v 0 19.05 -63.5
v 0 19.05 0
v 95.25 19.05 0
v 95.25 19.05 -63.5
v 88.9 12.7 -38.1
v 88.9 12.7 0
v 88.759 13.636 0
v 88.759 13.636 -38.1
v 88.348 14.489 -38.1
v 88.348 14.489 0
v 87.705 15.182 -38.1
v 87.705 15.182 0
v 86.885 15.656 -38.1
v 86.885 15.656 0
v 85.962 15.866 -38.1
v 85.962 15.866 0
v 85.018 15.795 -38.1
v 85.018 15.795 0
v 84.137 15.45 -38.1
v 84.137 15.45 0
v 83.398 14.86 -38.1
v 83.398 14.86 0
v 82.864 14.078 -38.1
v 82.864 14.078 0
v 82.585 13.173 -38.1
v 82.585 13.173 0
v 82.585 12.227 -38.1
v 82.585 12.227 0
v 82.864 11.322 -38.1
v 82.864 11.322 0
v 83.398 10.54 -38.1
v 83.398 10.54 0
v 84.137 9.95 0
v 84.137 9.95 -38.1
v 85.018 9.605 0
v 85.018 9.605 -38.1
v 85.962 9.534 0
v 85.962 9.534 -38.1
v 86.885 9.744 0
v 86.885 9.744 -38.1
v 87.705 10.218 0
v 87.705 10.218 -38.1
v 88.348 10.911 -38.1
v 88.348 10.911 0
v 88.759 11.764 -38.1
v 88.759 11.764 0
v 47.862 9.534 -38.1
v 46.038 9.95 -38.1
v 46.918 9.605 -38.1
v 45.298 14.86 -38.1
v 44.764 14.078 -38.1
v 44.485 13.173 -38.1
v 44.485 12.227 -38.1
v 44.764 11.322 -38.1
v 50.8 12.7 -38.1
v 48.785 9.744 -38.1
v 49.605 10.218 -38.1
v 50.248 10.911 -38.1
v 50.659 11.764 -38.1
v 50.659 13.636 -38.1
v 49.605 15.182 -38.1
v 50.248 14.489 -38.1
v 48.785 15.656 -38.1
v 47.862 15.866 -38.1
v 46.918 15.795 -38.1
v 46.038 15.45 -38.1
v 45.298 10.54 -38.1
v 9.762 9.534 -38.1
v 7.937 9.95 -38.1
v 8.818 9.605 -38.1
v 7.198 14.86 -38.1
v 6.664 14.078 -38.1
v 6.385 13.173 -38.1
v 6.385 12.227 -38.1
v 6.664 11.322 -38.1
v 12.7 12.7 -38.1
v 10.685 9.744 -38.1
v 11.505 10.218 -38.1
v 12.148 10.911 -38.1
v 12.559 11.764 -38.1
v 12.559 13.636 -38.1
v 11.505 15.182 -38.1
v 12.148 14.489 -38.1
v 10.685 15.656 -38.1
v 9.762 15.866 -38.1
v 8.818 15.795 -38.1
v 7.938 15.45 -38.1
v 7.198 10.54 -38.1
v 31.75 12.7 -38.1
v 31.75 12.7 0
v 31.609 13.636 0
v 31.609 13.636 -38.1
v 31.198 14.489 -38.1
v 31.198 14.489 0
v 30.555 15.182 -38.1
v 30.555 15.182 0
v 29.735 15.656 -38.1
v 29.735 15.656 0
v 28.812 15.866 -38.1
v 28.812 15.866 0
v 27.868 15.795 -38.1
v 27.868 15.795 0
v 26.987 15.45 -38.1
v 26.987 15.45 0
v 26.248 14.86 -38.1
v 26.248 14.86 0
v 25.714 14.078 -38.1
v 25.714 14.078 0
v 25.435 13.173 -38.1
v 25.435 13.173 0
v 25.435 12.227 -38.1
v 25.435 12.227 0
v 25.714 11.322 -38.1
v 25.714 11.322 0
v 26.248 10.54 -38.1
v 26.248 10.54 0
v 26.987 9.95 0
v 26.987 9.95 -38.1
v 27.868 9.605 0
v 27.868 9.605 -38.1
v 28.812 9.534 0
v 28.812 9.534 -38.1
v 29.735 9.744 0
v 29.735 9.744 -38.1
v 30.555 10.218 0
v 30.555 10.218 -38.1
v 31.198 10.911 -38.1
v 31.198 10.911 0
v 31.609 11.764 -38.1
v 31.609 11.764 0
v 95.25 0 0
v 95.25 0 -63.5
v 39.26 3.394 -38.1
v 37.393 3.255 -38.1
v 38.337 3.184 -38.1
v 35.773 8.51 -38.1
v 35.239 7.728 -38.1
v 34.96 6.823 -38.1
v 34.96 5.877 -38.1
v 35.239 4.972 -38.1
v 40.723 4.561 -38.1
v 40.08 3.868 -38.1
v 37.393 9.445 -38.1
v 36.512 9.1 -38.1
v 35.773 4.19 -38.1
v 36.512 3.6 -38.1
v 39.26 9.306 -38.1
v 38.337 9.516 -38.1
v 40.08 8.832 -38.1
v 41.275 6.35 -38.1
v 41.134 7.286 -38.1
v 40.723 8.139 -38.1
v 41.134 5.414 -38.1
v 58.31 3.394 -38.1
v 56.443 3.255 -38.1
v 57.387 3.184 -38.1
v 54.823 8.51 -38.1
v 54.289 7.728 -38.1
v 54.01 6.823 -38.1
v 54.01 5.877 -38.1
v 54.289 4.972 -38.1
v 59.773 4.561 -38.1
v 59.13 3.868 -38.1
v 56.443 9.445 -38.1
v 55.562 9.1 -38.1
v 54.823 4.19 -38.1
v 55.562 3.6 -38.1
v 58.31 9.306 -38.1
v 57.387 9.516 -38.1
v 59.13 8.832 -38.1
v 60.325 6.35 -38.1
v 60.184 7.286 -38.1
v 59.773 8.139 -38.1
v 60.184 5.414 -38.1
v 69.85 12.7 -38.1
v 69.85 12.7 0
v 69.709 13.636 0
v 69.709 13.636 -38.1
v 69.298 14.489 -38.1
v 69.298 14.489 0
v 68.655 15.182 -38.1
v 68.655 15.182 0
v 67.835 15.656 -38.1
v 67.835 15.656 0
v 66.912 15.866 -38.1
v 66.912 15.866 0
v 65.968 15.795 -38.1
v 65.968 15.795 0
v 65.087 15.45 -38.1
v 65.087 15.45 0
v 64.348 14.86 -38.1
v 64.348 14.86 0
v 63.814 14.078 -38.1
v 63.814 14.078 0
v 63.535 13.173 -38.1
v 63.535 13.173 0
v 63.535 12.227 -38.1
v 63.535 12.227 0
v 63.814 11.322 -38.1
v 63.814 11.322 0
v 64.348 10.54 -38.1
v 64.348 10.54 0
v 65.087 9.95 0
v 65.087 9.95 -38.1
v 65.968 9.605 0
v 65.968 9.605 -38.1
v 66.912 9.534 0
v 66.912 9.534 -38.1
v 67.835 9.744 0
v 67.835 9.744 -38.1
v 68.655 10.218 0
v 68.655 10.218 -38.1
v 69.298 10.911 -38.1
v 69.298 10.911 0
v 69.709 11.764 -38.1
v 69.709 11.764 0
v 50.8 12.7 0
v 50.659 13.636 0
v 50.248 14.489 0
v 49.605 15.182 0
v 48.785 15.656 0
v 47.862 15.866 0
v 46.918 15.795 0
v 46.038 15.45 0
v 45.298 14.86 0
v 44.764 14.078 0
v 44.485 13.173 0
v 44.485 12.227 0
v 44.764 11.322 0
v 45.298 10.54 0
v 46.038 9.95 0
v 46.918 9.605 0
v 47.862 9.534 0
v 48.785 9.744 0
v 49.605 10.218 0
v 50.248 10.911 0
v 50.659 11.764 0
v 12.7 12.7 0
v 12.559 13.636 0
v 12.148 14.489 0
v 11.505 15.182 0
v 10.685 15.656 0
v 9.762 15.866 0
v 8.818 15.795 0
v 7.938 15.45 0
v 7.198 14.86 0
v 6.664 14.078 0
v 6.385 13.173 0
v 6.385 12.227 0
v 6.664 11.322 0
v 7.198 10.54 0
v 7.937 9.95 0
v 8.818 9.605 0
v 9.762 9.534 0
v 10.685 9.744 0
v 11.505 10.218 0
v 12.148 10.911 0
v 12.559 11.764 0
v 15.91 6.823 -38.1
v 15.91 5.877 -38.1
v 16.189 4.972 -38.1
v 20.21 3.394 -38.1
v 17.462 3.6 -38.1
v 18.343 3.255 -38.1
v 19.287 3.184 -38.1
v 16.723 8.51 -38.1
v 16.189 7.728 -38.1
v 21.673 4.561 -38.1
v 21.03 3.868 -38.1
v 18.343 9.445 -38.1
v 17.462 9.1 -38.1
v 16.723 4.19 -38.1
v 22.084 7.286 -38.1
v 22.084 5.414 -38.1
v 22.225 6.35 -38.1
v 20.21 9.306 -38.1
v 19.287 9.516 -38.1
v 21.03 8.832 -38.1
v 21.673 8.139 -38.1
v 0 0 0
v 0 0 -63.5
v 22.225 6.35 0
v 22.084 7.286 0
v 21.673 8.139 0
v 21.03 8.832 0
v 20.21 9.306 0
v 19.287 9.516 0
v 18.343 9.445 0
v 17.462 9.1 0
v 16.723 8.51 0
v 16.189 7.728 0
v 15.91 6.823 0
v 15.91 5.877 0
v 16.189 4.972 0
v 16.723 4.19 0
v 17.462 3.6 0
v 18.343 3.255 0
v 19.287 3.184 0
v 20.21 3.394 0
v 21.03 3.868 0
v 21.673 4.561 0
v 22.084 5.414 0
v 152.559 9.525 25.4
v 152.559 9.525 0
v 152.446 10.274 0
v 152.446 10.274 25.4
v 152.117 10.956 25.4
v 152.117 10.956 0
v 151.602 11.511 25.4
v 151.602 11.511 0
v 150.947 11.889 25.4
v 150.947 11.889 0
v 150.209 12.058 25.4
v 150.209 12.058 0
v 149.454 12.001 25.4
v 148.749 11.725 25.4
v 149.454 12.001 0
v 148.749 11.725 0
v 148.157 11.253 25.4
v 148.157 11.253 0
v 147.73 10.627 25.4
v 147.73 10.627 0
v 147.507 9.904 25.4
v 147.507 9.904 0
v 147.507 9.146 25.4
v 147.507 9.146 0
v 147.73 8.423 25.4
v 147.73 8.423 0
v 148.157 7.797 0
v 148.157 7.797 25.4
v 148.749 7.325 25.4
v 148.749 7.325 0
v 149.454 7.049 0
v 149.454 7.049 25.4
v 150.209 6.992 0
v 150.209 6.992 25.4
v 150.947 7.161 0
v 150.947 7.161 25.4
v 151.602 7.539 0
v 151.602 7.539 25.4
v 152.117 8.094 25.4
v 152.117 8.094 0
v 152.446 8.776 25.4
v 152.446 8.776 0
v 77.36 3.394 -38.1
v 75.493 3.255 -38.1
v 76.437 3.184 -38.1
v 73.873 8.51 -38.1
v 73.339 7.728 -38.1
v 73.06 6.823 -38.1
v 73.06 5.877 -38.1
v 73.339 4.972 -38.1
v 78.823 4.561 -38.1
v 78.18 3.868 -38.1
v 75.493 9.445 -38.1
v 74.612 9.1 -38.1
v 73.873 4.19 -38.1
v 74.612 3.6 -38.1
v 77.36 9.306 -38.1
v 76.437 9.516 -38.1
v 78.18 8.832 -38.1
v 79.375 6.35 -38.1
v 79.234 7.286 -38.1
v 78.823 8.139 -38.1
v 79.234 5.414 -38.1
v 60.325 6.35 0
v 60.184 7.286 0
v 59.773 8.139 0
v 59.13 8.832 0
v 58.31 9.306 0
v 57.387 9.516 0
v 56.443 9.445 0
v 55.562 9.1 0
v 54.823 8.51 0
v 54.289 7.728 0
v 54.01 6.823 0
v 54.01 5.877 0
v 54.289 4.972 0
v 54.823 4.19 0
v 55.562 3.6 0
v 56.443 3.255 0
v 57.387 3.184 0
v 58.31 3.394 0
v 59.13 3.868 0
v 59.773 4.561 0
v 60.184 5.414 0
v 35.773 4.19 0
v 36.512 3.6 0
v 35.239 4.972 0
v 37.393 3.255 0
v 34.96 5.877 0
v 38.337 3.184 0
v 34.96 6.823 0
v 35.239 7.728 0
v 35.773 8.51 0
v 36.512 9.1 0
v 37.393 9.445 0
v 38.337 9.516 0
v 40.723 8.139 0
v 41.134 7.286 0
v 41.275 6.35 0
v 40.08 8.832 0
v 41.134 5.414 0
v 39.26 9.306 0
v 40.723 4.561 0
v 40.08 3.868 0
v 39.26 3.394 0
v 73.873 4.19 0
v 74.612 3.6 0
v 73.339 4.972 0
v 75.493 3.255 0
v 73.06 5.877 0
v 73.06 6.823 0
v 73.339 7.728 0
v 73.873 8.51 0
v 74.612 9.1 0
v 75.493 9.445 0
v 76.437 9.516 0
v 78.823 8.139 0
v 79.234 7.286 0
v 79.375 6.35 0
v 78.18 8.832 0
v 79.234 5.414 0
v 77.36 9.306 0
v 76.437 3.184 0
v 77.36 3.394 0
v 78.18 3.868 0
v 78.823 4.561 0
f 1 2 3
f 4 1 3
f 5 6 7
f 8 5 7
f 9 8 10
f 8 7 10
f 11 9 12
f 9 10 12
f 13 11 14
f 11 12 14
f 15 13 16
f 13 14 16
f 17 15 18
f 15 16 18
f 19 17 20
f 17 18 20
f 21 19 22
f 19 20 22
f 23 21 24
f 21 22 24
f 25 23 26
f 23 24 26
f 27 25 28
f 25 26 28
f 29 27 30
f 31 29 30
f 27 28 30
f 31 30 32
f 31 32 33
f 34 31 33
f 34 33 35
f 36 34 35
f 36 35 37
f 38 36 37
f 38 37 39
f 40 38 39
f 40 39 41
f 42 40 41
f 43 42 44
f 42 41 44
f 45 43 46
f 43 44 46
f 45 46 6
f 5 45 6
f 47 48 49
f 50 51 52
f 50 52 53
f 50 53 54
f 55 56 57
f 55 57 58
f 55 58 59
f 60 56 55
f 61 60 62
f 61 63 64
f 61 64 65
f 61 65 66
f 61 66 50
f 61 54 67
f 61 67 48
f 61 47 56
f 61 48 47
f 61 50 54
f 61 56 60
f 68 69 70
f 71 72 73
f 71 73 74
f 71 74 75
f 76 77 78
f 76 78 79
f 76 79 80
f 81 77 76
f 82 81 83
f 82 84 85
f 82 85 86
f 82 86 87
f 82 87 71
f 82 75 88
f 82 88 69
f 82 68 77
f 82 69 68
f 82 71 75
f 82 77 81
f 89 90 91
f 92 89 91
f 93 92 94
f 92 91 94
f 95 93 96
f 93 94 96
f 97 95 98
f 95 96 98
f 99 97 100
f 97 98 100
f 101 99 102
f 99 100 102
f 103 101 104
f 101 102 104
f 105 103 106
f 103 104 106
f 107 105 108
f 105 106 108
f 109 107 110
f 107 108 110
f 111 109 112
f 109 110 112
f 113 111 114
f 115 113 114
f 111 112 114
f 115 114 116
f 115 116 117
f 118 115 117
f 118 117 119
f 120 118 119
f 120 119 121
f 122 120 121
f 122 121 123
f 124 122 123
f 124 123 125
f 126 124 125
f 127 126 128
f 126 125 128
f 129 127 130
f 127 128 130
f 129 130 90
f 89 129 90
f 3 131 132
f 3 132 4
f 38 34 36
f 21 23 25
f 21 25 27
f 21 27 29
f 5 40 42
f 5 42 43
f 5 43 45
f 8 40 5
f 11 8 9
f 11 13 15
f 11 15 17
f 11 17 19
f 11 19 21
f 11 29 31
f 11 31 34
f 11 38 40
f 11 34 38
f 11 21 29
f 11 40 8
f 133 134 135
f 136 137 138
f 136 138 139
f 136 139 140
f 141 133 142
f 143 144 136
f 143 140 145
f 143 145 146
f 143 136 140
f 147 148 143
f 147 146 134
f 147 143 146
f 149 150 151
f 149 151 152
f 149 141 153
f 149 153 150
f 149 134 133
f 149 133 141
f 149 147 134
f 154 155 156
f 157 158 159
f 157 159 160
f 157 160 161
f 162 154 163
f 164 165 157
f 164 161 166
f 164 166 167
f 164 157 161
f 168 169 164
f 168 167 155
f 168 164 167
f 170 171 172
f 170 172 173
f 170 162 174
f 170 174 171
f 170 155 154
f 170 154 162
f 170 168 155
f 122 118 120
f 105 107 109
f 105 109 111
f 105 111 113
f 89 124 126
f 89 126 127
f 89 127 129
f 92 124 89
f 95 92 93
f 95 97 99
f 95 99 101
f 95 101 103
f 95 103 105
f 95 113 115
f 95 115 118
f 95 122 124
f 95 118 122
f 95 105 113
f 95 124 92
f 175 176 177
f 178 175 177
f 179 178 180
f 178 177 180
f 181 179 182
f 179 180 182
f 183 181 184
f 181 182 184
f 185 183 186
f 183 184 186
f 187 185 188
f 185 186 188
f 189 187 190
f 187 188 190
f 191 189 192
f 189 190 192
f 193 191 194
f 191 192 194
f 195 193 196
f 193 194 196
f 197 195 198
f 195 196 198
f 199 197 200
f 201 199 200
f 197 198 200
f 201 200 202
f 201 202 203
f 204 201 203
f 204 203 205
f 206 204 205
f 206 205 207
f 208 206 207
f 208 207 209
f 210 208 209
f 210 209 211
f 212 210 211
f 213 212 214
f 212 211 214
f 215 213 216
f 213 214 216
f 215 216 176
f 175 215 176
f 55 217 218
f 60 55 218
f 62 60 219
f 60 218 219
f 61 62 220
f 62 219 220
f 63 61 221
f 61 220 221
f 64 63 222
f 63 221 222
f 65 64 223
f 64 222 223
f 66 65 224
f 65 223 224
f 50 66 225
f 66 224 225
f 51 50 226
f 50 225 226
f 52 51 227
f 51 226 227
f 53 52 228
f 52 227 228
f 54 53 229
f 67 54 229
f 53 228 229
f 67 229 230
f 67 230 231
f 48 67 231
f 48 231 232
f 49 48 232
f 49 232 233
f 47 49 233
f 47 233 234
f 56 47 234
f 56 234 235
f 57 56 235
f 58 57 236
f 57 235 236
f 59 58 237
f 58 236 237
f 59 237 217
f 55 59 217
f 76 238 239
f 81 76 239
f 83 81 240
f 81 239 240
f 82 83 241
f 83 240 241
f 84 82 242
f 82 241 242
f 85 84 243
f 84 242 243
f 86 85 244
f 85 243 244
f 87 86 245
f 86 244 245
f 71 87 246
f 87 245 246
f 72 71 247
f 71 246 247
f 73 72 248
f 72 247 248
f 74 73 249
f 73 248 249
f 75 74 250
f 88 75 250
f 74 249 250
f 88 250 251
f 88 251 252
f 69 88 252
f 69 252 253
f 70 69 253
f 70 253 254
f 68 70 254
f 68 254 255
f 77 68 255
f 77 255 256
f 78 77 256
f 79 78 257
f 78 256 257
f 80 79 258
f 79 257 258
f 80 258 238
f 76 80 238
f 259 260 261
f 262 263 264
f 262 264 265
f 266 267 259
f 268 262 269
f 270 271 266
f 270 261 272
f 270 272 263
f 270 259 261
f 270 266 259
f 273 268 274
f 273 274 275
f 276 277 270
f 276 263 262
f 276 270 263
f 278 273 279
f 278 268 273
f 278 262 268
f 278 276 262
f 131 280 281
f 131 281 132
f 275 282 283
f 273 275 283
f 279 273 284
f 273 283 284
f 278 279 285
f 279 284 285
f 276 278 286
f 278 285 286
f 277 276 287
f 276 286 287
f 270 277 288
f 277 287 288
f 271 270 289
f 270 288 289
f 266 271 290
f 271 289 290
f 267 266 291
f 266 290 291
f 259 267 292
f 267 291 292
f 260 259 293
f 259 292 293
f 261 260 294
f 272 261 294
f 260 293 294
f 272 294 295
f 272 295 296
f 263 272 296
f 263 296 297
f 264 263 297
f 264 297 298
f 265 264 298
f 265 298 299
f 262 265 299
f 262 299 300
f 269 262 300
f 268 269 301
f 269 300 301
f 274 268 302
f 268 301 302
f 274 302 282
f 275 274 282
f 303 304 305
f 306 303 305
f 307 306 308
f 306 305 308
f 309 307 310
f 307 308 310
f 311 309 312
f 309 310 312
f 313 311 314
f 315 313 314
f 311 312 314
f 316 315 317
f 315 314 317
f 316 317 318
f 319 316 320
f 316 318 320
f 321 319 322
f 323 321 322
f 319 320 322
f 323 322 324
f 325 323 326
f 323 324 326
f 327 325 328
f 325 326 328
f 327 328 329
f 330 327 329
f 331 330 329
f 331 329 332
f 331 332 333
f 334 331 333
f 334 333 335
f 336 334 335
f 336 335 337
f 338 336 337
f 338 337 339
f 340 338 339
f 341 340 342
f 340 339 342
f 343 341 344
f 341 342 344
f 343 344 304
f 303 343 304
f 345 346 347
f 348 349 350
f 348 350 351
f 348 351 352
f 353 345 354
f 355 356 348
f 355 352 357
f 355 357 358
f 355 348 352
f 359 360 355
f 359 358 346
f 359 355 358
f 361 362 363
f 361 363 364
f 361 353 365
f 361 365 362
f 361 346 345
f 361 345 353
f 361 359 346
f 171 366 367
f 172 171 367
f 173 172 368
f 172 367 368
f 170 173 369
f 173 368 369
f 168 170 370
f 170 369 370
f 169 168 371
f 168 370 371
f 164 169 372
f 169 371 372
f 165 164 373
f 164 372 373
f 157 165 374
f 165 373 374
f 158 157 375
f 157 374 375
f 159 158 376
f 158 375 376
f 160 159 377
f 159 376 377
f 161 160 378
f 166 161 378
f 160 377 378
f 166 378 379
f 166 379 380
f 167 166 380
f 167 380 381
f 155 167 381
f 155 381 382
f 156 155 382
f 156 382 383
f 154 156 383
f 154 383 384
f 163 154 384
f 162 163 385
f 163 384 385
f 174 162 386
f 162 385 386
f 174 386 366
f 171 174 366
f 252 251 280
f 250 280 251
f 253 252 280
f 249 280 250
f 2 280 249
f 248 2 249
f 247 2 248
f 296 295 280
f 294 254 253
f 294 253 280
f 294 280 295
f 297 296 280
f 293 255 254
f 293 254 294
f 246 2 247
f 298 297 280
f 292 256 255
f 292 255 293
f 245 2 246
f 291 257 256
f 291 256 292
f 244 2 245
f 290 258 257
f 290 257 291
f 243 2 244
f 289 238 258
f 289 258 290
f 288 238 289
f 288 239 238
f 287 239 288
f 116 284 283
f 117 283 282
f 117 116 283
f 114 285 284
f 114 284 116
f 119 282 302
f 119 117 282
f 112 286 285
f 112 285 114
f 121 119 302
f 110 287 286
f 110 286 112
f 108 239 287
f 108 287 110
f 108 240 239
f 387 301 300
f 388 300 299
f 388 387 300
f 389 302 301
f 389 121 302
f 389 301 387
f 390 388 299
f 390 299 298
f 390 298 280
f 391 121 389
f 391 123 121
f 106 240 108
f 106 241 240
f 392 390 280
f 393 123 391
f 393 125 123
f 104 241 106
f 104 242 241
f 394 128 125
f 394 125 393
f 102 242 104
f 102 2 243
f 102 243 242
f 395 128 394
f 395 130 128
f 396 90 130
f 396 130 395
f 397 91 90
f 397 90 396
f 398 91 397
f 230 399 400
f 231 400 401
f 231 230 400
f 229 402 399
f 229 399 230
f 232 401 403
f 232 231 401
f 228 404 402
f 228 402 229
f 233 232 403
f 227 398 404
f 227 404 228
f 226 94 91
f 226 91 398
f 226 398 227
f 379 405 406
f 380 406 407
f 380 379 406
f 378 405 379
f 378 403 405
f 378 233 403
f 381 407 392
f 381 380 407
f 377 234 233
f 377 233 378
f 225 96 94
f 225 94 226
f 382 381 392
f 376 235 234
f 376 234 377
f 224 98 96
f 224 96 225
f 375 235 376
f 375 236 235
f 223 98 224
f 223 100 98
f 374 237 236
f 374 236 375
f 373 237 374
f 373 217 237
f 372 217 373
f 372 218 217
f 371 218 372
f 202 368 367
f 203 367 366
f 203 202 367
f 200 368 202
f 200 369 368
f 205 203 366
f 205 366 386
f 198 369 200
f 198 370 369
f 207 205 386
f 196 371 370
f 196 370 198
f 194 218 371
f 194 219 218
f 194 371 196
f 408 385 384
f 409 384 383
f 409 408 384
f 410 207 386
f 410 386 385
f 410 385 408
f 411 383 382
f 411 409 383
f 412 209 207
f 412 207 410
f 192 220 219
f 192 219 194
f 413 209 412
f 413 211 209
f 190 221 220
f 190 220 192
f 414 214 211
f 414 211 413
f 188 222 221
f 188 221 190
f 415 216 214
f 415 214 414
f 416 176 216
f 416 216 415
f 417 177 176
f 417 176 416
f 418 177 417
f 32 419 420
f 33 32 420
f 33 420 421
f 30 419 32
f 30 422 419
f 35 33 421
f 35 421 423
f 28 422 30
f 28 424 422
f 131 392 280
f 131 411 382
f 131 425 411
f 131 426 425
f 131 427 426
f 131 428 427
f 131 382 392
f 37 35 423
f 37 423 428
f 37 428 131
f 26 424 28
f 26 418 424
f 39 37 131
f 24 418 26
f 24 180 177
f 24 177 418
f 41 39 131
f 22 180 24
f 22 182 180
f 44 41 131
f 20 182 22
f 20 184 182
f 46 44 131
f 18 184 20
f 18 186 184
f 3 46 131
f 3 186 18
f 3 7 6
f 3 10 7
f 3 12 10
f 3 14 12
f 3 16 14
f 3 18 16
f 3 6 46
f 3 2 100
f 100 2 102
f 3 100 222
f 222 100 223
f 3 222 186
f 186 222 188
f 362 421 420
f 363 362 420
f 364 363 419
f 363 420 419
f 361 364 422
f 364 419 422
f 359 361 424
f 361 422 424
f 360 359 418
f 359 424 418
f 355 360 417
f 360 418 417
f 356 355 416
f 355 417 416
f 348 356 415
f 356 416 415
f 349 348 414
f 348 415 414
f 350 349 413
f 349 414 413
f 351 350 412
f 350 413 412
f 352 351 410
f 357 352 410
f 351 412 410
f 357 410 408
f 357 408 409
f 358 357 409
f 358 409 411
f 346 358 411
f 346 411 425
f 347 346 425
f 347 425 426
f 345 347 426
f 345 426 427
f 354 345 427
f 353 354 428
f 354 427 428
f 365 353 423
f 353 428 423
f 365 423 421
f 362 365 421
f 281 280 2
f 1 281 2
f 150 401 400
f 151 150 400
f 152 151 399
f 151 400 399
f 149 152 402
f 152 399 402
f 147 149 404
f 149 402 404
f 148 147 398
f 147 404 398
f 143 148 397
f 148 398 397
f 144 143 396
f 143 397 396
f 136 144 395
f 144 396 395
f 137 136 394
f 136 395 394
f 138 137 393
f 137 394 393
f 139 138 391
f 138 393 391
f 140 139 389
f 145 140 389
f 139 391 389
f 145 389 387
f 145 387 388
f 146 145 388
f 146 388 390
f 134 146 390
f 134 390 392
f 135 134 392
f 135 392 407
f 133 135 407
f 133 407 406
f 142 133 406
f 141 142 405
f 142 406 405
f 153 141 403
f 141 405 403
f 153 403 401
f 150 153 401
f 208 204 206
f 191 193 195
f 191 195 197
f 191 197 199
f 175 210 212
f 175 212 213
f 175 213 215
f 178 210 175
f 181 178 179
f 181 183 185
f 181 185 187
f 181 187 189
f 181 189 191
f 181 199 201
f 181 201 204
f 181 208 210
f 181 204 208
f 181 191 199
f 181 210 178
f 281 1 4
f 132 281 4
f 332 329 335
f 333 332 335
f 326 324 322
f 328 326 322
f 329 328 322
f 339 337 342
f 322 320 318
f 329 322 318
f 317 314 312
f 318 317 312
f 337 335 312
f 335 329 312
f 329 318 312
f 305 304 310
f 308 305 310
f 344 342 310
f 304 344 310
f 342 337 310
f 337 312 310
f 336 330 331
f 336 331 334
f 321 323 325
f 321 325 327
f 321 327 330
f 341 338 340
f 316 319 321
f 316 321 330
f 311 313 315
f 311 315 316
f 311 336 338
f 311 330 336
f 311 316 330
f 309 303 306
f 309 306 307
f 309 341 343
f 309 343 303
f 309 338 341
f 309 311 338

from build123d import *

# Parameters (mm, degrees)
F0_W     = 95.25
F0_H     = 19.05
F1_DEPTH = 63.5
F2_R     = 3.175
F3_DEPTH = 38.1
F4_DEPTH = 38.1
F5_R     = 2.54
F6_DEPTH = 25.4


with BuildPart() as f1:
    # F0 (on Top) → F1 (new body)
    with BuildSketch(Plane.XY):
        with Locations((47.625, 9.525)):
            Rectangle(F0_W, F0_H)
    extrude(amount=-F1_DEPTH)

    # F2 (on Top) → F3 (cut)
    with BuildSketch(Plane.XY):
        with Locations((9.525, 12.7)):
            Circle(F2_R)
        with Locations((28.575, 12.7)):
            Circle(F2_R)
        with Locations((47.625, 12.7)):
            Circle(F2_R)
        with Locations((66.675, 12.7)):
            Circle(F2_R)
        with Locations((85.725, 12.7)):
            Circle(F2_R)
        with Locations((19.05, 6.35)):
            Circle(F2_R)
        with Locations((38.1, 6.35)):
            Circle(F2_R)
        with Locations((57.15, 6.35)):
            Circle(F2_R)
        with Locations((76.2, 6.35)):
            Circle(F2_R)
    extrude(amount=F3_DEPTH, mode=Mode.SUBTRACT)

    # F2 (on Top) → F4 (cut)
    with BuildSketch(Plane.XY):
        with Locations((9.525, 12.7)):
            Circle(F2_R)
        with Locations((28.575, 12.7)):
            Circle(F2_R)
        with Locations((47.625, 12.7)):
            Circle(F2_R)
        with Locations((66.675, 12.7)):
            Circle(F2_R)
        with Locations((85.725, 12.7)):
            Circle(F2_R)
        with Locations((19.05, 6.35)):
            Circle(F2_R)
        with Locations((38.1, 6.35)):
            Circle(F2_R)
        with Locations((57.15, 6.35)):
            Circle(F2_R)
        with Locations((76.2, 6.35)):
            Circle(F2_R)
    extrude(amount=-F4_DEPTH, mode=Mode.SUBTRACT)


with BuildPart() as f6:
    # F5 (on Top) → F6 (new body)
    with BuildSketch(Plane.XY):
        with Locations((150.01875, 9.525)):
            Circle(F5_R)
    extrude(amount=F6_DEPTH)


solid = Compound([f1.part, f6.part])
